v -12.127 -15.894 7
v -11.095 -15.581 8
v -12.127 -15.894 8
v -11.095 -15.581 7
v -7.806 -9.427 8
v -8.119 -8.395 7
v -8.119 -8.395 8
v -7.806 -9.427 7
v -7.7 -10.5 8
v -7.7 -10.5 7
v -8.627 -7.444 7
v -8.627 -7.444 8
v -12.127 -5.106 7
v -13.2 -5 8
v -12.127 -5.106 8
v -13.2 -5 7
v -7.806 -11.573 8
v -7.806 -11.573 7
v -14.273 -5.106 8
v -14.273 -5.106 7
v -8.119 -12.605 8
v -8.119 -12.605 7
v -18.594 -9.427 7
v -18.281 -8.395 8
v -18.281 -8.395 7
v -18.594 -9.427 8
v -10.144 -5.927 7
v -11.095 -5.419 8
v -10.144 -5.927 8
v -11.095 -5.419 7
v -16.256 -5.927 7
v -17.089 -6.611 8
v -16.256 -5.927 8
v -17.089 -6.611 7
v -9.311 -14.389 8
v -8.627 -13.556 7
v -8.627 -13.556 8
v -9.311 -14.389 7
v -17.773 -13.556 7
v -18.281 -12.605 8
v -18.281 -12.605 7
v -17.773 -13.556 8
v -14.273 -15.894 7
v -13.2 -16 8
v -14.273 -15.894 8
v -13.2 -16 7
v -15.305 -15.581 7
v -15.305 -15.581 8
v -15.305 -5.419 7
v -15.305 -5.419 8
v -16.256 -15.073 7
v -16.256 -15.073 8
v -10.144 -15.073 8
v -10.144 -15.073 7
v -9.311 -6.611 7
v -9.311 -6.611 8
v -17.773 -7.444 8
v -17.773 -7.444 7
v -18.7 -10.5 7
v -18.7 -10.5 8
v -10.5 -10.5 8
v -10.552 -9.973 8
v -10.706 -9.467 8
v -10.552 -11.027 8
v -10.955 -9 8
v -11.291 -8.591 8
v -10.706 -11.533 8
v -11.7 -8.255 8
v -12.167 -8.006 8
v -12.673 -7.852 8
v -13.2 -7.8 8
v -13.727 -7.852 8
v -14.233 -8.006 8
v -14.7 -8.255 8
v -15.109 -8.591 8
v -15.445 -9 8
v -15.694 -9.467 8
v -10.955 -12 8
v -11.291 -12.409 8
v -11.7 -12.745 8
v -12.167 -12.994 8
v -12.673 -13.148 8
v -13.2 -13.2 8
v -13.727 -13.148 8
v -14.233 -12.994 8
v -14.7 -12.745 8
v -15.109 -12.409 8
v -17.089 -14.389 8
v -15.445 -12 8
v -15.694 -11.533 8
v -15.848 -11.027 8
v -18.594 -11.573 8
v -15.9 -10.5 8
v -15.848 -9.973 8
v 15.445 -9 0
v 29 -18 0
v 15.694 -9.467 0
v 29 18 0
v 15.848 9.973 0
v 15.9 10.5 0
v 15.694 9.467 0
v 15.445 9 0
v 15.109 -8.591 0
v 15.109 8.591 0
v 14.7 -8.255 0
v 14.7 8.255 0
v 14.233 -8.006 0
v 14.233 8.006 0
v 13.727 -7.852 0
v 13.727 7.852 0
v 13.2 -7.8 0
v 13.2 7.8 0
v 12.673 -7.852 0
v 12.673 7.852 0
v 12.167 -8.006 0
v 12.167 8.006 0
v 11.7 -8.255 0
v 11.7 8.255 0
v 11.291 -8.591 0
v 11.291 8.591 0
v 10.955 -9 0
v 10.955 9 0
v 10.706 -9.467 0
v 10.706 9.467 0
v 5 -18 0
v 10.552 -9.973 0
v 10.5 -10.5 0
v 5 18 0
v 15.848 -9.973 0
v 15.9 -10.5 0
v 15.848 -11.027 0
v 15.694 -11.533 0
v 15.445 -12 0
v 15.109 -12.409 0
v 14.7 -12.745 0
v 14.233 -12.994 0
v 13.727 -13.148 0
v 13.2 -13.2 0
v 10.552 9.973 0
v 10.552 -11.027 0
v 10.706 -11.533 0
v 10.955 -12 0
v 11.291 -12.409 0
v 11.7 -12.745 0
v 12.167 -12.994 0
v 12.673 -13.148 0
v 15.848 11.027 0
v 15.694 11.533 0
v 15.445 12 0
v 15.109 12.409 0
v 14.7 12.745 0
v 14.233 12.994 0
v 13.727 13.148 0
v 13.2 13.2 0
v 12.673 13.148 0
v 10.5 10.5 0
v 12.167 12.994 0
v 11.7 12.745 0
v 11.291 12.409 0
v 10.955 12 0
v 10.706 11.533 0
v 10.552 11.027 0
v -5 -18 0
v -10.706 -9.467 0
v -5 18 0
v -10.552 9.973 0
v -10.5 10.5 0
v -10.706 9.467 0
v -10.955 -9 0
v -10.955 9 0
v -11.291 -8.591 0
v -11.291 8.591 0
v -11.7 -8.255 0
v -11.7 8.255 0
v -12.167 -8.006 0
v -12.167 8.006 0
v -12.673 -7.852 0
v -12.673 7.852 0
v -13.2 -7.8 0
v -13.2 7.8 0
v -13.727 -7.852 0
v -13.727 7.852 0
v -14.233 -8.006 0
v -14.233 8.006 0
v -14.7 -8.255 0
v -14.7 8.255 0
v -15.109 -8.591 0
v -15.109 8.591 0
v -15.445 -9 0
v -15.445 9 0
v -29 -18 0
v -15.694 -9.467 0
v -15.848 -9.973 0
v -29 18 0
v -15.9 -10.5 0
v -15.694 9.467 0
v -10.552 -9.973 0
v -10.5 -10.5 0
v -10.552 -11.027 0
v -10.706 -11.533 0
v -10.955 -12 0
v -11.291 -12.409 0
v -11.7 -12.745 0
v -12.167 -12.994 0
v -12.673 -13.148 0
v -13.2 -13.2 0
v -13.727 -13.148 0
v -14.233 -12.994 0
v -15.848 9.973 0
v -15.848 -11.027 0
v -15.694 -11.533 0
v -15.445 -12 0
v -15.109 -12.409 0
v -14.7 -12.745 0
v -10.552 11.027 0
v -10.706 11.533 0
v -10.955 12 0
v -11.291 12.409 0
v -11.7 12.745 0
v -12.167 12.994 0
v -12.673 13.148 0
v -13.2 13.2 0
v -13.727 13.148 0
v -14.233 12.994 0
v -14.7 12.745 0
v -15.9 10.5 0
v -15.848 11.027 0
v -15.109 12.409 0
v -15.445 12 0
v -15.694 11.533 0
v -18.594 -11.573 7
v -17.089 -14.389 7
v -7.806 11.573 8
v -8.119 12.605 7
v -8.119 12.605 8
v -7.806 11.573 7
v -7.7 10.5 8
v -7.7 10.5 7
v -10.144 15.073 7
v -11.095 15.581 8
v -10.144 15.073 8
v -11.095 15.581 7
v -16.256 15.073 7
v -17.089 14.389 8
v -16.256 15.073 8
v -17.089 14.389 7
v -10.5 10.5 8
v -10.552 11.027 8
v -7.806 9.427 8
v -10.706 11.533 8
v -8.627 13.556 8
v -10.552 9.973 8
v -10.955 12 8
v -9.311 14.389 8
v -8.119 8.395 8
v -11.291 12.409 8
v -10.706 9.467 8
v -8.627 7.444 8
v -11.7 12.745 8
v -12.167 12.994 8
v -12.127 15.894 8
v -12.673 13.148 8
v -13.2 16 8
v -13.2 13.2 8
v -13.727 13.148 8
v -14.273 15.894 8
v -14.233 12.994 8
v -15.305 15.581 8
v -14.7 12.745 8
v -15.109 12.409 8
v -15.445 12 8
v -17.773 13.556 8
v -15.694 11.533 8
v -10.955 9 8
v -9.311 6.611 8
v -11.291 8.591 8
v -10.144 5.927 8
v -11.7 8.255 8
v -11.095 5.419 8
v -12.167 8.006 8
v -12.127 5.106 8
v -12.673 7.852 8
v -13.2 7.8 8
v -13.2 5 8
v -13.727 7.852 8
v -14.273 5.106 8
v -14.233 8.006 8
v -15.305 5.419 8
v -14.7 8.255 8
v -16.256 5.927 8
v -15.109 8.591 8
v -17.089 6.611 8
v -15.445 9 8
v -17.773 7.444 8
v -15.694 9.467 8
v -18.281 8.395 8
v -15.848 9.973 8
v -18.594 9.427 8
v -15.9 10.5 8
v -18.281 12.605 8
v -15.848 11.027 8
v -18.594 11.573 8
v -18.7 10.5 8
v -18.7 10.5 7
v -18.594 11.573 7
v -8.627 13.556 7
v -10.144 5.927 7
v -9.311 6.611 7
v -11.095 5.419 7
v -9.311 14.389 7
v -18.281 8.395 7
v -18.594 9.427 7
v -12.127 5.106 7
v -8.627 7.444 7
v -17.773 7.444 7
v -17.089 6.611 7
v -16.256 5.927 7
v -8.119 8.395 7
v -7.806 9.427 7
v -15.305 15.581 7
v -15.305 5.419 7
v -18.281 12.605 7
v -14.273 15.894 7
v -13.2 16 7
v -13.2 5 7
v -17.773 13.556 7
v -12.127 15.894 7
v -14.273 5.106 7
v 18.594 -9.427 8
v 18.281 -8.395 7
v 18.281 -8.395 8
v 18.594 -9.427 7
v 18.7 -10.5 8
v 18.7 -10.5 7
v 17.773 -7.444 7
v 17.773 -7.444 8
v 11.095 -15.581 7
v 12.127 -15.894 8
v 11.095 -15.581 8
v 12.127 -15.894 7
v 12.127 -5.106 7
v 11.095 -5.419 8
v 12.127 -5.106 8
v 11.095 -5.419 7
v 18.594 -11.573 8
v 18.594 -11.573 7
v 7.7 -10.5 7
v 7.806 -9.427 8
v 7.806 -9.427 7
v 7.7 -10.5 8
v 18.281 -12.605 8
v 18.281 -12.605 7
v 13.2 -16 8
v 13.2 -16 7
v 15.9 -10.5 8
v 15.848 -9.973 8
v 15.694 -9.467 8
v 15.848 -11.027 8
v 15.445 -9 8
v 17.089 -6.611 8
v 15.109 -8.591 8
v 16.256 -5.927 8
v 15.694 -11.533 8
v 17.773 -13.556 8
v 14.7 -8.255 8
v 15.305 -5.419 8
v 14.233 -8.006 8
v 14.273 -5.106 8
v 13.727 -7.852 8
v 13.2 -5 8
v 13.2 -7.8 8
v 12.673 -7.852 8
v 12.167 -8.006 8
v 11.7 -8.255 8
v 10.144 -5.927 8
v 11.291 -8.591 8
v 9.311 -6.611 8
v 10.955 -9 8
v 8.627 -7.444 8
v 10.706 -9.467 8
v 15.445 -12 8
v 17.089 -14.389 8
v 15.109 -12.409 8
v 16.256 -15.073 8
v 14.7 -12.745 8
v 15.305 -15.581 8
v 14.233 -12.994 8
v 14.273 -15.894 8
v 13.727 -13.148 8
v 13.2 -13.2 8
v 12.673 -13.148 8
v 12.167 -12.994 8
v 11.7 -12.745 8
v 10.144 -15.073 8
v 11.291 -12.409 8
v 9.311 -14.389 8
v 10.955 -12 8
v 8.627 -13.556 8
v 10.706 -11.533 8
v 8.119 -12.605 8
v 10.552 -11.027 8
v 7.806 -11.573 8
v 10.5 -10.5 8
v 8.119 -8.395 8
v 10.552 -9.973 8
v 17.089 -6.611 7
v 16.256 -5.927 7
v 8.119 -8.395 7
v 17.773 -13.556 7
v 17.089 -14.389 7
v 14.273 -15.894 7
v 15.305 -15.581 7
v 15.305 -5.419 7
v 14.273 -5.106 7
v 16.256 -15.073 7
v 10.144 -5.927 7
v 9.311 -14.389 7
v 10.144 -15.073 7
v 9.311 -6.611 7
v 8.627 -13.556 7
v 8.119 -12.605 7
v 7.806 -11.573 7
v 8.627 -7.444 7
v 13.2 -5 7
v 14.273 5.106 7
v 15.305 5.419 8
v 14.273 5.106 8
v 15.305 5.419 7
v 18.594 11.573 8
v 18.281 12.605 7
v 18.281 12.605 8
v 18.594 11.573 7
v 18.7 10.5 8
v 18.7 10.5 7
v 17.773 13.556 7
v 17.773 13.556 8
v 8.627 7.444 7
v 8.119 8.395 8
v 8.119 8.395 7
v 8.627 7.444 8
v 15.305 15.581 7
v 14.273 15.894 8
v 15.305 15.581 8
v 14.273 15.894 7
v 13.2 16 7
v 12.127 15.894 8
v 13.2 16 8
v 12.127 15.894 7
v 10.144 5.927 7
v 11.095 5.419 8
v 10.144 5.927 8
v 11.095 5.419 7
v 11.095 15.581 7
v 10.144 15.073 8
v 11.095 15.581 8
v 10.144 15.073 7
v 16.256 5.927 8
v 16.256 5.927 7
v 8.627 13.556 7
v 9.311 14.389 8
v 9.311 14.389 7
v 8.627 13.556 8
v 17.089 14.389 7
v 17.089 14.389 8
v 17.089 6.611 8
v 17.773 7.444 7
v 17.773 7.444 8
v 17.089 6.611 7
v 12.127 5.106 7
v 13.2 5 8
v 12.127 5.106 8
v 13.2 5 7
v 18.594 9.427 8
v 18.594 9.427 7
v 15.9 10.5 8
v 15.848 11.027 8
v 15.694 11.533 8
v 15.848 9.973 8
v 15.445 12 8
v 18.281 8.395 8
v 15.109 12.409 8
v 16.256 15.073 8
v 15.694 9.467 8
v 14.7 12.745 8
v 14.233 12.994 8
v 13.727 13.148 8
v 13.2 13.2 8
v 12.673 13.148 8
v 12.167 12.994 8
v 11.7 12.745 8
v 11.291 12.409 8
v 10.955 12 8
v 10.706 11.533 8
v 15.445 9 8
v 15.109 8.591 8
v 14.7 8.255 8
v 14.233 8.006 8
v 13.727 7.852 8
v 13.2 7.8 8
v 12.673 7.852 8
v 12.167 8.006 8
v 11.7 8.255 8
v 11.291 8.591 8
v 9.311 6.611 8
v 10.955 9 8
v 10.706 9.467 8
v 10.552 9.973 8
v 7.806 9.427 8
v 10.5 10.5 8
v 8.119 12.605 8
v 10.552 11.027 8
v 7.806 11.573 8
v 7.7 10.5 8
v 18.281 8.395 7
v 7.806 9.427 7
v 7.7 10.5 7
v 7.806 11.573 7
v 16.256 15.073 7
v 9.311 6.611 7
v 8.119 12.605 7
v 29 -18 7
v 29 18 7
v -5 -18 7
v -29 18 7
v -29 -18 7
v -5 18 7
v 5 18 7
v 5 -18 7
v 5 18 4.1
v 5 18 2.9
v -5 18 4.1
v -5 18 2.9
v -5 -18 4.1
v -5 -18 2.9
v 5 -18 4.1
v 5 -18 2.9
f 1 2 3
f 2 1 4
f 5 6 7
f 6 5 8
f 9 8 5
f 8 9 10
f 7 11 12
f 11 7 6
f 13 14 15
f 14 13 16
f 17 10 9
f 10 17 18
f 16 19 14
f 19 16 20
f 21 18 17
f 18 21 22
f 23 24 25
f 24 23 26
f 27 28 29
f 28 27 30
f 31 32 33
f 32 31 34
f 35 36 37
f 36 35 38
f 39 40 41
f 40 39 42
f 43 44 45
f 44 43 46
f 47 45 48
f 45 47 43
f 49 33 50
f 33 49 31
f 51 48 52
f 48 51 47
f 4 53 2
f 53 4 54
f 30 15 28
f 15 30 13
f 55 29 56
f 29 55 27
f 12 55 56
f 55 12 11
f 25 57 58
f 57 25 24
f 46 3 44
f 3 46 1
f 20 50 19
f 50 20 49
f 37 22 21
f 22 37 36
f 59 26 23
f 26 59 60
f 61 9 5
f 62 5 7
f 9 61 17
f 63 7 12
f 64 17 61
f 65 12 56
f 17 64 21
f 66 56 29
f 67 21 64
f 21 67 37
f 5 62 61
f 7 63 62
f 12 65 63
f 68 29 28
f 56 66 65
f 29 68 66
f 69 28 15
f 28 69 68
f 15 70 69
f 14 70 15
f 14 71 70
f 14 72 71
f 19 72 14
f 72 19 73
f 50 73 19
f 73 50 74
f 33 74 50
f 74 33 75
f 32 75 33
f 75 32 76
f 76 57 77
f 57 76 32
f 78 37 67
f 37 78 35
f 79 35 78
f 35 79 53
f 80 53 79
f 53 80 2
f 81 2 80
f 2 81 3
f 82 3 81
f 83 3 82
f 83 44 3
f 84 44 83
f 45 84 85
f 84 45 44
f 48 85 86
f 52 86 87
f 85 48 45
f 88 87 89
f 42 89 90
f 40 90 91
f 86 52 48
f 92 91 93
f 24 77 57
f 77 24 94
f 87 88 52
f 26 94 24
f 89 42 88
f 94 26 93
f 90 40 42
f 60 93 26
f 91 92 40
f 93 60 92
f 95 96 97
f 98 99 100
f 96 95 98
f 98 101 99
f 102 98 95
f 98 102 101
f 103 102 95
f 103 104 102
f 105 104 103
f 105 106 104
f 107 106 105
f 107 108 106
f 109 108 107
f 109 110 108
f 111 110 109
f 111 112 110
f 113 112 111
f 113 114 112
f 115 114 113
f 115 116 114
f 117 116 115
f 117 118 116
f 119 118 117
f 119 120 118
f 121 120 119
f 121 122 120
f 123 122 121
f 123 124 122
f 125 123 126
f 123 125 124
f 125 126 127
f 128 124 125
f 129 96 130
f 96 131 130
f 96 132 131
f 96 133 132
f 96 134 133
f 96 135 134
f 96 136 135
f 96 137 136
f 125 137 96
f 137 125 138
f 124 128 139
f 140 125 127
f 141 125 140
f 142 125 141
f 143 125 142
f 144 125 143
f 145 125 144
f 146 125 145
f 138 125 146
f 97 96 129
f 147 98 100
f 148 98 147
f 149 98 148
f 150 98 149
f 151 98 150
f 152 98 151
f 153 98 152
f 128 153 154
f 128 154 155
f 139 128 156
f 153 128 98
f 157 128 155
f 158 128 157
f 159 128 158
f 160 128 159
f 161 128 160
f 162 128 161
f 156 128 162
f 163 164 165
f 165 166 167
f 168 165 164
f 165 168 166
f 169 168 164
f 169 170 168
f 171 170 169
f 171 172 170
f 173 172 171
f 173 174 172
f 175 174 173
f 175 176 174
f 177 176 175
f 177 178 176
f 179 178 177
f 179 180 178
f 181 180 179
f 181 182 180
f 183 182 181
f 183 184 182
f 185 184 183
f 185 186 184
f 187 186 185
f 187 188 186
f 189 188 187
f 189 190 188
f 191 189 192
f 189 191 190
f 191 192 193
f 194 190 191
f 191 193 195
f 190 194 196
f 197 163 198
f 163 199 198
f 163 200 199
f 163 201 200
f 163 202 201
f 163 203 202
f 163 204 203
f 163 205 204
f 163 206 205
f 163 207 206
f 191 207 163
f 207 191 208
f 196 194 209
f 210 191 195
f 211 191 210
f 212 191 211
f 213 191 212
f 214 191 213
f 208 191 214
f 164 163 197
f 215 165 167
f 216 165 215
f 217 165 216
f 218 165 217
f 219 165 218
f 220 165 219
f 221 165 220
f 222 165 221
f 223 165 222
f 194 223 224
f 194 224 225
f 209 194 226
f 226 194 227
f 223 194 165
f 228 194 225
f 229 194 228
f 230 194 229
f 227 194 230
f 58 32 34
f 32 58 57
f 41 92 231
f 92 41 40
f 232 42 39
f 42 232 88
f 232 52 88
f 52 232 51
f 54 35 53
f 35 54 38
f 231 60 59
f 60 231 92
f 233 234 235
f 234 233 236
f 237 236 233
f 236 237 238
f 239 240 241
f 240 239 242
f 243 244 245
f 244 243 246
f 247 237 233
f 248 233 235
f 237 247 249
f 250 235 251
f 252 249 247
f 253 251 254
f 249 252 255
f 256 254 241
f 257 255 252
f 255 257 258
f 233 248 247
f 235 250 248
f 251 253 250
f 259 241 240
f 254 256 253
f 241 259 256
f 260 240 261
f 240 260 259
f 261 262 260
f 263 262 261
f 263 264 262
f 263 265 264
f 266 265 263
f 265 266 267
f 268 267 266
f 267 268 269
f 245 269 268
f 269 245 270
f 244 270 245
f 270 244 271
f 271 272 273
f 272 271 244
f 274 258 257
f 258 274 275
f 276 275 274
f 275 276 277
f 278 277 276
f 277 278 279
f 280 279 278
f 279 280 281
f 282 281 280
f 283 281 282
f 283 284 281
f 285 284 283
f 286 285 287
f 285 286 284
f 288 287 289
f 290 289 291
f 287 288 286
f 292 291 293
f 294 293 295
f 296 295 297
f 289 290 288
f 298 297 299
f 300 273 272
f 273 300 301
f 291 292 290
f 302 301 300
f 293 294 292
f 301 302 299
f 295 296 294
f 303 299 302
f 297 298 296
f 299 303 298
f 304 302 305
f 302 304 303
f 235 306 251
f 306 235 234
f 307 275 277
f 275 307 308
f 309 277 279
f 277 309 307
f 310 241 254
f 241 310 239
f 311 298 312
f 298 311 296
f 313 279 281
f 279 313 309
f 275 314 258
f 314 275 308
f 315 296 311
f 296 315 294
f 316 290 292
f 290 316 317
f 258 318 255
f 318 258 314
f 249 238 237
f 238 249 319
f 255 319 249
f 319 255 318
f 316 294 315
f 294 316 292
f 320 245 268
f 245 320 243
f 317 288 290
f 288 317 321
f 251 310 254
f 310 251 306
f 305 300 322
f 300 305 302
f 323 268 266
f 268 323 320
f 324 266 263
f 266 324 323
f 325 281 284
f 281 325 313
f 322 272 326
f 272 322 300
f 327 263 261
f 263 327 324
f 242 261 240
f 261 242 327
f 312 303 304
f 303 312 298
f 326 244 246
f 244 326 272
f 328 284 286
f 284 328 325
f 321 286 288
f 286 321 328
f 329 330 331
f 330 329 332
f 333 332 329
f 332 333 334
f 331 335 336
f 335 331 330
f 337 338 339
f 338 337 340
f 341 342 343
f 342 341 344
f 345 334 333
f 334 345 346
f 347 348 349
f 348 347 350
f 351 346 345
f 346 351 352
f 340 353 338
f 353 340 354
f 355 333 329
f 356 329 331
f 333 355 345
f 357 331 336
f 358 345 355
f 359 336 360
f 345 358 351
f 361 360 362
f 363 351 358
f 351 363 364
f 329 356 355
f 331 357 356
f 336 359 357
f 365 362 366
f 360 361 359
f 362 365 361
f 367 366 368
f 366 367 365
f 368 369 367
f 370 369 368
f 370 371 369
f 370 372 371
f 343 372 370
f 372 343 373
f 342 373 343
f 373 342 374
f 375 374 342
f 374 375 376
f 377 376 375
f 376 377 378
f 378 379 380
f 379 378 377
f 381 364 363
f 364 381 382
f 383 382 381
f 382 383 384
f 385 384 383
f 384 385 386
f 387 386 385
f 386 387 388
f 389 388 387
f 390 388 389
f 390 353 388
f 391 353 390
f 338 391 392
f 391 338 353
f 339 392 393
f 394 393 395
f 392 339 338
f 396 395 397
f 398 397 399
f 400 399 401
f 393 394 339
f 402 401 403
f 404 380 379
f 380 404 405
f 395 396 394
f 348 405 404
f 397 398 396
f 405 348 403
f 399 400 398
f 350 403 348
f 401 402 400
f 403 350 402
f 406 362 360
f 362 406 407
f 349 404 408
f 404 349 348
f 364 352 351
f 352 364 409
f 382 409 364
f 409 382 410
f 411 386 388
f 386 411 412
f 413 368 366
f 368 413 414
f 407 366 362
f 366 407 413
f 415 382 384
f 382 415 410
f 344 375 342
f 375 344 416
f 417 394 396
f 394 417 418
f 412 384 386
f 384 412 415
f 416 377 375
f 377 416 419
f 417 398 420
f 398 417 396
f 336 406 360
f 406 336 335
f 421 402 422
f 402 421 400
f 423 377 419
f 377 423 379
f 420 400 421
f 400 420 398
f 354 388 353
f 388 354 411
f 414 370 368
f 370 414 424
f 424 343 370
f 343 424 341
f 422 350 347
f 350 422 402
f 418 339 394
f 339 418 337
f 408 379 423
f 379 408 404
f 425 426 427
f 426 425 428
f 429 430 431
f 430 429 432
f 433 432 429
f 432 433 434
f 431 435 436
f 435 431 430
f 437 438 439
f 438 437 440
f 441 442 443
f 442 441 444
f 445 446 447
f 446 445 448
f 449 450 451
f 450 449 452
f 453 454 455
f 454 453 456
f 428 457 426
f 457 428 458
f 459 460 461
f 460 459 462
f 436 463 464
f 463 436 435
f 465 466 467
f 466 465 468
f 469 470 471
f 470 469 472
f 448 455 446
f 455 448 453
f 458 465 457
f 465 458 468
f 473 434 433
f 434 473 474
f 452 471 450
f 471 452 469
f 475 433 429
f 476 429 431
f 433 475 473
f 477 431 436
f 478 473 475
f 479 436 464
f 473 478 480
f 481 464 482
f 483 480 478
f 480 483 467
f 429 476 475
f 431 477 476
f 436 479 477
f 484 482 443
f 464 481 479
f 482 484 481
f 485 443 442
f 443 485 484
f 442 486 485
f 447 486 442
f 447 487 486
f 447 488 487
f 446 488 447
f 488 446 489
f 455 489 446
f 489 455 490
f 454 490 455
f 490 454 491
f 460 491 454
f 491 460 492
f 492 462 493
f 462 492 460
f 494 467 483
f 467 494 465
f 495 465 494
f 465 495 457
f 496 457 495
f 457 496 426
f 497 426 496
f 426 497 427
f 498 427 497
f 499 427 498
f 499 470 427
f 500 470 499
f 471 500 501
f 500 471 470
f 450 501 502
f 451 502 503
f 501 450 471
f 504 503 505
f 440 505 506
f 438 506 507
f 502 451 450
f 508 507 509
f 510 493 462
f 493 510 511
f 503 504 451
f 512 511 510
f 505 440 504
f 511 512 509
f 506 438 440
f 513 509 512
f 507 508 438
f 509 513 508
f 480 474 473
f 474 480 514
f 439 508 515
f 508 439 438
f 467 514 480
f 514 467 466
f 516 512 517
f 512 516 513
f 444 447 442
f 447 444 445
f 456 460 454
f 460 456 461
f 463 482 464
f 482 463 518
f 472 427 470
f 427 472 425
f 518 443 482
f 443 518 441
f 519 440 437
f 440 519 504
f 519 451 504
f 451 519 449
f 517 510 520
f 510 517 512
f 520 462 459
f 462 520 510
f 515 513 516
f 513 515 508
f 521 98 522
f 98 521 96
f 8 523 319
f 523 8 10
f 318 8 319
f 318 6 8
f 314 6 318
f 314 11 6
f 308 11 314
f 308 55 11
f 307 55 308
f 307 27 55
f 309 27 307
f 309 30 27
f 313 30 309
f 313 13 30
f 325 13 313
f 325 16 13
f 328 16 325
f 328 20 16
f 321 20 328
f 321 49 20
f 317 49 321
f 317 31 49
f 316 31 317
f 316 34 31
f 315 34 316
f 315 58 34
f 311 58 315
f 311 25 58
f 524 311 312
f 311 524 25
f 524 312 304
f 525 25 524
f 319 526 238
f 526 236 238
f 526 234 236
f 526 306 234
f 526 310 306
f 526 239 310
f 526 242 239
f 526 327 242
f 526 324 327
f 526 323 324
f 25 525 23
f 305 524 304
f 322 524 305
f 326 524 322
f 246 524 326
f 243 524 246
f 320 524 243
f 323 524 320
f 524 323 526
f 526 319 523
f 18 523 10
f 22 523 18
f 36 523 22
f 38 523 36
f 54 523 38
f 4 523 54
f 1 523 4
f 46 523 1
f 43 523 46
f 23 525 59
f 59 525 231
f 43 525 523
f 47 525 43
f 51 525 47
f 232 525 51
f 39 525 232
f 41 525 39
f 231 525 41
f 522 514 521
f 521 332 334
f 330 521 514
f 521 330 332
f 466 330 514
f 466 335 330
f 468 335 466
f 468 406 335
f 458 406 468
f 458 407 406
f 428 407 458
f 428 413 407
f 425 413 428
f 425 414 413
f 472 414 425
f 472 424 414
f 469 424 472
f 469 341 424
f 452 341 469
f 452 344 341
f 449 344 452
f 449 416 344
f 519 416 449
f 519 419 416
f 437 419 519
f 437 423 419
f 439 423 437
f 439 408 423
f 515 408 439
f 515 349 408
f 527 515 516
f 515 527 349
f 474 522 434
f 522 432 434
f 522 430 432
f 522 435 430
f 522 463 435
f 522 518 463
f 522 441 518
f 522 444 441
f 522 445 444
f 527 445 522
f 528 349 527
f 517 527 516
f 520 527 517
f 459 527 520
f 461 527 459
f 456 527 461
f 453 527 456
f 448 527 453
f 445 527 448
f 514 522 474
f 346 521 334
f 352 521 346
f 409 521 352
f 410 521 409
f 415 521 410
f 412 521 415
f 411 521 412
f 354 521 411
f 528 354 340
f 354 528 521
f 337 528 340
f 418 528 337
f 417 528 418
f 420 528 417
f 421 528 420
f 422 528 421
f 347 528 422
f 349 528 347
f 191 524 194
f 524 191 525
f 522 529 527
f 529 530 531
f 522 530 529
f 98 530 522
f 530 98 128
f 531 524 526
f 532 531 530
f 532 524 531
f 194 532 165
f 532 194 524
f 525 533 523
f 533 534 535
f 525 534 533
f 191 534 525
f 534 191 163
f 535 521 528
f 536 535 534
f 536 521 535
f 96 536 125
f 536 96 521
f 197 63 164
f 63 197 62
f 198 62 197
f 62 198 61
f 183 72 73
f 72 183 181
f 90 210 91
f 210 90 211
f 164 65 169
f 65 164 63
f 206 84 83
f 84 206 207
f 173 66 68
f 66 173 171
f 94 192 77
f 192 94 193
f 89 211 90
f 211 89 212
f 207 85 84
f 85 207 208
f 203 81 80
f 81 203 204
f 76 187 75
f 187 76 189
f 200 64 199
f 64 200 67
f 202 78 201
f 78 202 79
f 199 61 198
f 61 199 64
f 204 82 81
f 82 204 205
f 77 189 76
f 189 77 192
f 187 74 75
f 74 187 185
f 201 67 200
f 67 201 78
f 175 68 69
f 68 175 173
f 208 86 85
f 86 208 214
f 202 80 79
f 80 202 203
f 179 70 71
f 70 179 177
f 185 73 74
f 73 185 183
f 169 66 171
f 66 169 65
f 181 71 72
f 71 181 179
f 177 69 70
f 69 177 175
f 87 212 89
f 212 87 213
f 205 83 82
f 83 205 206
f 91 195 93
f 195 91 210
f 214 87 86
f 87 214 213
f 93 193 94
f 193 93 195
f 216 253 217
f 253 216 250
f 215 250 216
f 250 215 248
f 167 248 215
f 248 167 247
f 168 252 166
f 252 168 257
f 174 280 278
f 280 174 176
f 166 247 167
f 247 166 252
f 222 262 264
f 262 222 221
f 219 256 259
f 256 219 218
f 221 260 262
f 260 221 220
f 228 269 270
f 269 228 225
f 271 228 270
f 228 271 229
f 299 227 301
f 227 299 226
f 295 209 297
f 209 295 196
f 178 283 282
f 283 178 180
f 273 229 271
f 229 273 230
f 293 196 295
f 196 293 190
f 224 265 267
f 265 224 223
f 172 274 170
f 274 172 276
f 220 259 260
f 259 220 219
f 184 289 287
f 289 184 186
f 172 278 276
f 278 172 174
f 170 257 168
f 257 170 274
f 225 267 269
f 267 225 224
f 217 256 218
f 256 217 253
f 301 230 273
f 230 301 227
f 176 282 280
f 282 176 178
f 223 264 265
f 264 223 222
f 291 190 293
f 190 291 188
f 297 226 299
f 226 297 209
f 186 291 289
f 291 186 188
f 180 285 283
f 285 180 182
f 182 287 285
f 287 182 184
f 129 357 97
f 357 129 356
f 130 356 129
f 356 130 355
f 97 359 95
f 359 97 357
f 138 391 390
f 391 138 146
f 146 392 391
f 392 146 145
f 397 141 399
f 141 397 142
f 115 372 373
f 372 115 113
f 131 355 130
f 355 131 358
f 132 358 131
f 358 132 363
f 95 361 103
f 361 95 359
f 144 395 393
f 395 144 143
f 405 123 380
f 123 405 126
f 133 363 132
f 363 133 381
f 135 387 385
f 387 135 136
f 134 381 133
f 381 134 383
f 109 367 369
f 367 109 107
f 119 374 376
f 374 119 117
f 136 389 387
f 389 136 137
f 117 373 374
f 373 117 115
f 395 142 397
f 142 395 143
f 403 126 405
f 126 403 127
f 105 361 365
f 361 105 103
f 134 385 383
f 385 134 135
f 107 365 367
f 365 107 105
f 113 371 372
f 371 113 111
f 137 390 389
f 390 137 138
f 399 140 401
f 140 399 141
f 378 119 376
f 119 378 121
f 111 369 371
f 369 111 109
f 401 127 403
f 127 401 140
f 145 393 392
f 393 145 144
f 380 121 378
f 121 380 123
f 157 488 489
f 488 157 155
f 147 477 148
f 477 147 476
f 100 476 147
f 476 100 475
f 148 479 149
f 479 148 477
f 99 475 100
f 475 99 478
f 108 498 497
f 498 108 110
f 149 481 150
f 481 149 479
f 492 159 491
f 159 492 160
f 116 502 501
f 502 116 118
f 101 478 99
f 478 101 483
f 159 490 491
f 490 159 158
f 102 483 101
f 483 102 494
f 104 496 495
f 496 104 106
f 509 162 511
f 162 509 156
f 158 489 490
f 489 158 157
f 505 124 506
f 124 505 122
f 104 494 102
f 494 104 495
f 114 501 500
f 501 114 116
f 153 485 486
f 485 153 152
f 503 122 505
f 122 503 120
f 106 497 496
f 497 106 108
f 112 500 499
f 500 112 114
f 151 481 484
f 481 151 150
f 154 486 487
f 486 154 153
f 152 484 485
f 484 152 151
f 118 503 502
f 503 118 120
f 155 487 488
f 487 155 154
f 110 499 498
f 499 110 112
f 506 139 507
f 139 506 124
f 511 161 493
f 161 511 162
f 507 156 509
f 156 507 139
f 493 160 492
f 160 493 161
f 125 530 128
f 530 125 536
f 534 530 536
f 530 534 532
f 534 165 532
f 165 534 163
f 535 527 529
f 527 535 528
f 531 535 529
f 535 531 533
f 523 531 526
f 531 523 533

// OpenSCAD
$fn = 32;

// ----------------------------------------------------------------------
// Living hinge: 58 x 36 mm plates, 1.2 mm flexible web
// ----------------------------------------------------------------------

// --- parameters (mm) ---
plate_len = 24;           // plate length outside the web
plate_w = 36;             // plate width
thick = 7;                // plate thickness
web_half = 5;             // half width of the flex band
web_t = 1.2;              // flexible web thickness
web_z = 2.9;              // web position inside the thickness
boss_d = 11;              // screw boss diameter
boss_h = 8;               // screw boss height
boss_x = 13.2;            // screw boss distance from the web
screw_d = 5.4;            // screw hole

difference() {
  union() {
    /* one flat strip, later thinned at the middle */
    translate([-29, -18, 0]) cube([58, 36, 7]);
    /* screw bosses, sunk 0.5 mm into the plates */
    for (sx = [-13.2, 13.2]) {
      for (sy = [-10.5, 10.5]) {
        translate([sx, sy, 0]) cylinder(h = boss_h, d = boss_d);
      }
    }
  }
  /* channel from below: leaves the web on top of it */
  translate([-5, -20.5, -2.5]) cube([10, 41, 5.4]);
  /* channel from above: thins the web down to web_t */
  translate([-5, -20.5, 4.1]) cube([10, 41, 5.4]);
  /* screw holes through the bosses */
  for (sx = [-13.2, 13.2]) {
    for (sy = [-10.5, 10.5]) {
      translate([sx, sy, -2.5]) cylinder(h = boss_h + 5, d = screw_d);
    }
  }
}
